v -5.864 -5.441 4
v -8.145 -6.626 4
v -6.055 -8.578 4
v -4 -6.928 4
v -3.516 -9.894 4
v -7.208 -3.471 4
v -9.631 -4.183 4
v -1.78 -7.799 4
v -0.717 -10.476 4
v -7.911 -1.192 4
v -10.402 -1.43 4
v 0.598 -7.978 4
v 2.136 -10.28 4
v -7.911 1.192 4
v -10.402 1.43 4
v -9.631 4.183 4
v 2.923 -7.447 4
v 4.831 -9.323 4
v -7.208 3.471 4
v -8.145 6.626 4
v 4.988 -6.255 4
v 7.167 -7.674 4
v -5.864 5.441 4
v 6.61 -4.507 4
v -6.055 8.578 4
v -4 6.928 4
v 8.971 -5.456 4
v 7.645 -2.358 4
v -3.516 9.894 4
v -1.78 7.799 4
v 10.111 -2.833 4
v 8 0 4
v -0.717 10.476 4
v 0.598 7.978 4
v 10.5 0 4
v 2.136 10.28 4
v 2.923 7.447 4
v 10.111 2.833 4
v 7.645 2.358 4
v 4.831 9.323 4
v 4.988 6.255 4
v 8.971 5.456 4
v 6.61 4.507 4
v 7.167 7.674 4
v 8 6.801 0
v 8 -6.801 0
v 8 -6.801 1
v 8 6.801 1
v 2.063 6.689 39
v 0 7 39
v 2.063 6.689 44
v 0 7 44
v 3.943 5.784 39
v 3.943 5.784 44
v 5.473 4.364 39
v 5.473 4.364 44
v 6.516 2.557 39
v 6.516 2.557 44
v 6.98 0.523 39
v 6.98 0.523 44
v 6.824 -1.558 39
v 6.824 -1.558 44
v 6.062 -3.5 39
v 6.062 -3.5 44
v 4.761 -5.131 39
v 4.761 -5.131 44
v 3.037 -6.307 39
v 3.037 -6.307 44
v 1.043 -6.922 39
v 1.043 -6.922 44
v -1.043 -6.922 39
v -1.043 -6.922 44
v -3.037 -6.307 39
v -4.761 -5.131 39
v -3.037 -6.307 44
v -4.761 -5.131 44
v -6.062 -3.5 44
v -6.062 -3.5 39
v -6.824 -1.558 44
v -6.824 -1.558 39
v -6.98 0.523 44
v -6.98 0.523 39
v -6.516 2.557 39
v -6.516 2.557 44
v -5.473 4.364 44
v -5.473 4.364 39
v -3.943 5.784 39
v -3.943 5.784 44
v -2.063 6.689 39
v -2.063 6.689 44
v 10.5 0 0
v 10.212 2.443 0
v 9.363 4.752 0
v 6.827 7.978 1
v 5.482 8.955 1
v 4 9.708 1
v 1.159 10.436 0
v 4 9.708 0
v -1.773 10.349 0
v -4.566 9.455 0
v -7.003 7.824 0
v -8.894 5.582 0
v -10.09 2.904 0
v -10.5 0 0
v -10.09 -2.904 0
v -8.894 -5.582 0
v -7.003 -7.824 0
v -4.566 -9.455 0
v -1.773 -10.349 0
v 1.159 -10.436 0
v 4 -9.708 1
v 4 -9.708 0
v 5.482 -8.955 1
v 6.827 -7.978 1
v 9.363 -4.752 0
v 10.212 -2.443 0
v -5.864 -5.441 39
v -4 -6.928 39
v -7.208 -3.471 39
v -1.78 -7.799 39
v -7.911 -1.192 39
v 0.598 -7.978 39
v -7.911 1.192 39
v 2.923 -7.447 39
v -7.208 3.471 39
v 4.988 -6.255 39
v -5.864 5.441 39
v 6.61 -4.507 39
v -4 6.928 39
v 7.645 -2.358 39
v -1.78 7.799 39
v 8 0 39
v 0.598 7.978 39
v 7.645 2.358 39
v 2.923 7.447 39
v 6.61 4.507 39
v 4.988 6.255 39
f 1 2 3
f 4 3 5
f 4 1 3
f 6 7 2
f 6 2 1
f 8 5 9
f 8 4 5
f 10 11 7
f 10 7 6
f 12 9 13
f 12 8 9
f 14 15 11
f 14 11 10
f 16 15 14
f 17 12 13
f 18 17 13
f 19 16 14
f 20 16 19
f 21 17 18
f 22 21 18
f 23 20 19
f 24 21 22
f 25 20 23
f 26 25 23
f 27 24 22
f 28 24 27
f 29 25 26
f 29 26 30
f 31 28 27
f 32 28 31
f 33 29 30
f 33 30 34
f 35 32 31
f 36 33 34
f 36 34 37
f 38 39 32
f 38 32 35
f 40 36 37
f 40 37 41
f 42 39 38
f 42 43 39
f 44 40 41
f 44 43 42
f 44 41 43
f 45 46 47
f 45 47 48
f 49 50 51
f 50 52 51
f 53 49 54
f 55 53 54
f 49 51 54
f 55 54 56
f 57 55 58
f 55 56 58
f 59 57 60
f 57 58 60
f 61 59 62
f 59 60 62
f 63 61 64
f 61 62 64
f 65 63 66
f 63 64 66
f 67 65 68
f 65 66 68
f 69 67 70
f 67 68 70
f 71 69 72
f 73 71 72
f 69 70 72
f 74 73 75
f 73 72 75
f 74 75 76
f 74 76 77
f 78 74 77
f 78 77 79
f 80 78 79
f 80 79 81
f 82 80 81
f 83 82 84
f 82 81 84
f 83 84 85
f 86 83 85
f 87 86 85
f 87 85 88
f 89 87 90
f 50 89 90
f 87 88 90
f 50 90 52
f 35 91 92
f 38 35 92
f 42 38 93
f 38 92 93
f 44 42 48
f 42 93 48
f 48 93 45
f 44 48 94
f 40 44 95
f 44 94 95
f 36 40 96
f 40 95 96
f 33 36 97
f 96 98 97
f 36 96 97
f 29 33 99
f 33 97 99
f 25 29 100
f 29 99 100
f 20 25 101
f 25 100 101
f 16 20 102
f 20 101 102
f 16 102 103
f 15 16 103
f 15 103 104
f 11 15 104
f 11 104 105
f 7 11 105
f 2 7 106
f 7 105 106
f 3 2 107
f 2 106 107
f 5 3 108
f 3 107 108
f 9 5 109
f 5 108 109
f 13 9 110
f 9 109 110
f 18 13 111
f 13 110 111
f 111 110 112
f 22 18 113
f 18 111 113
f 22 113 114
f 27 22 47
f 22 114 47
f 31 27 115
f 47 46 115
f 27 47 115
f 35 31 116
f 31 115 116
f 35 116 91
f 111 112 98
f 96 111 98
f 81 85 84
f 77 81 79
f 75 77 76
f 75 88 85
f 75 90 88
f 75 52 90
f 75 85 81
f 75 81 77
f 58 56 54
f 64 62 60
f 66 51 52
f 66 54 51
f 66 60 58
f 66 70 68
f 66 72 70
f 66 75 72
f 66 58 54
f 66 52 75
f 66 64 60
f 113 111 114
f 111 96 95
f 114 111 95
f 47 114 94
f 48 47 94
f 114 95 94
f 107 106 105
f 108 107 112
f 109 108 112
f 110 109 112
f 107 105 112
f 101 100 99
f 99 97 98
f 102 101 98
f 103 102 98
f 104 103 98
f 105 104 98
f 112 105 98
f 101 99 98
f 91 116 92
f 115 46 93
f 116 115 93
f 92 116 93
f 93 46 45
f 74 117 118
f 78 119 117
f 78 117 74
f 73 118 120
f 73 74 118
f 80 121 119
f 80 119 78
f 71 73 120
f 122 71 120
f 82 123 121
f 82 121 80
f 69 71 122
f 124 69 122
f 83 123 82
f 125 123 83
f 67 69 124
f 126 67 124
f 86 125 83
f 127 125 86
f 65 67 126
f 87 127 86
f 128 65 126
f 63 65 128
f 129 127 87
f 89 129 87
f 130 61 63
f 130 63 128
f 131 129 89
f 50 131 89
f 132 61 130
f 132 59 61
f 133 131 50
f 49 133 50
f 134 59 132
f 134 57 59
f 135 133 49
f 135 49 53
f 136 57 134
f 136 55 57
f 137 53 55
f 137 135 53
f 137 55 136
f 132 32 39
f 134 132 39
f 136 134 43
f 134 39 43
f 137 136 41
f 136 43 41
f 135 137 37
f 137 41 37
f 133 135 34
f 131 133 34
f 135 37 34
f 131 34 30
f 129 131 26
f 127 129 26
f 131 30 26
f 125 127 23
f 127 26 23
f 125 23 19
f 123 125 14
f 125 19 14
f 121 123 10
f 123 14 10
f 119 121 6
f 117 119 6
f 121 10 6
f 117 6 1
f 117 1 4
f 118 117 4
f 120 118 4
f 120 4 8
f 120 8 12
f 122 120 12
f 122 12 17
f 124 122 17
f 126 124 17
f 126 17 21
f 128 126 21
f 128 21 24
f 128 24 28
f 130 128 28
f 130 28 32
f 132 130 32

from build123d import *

# Parameters (mm, degrees)
F0_R     = 10.5
F1_DEPTH = 4
F2_R     = 8
F3_DEPTH = 39
F4_W     = 7
F4_H     = 5
F6_W     = 4
F6_H     = 24.978078
F7_DEPTH = 1


with BuildPart() as f1:
    # F0 (on Top) → F1 (new body)
    with BuildSketch(Plane.XY):
        Circle(F0_R)
    extrude(amount=F1_DEPTH)

    # F2 (on Top) → F3 (join)
    with BuildSketch(Plane.XY):
        Circle(F2_R)
    extrude(amount=F3_DEPTH)

    # F4 (on Right) → F5 (revolve)
    with BuildSketch(Plane.YZ):
        with Locations((3.5, 41.5)):
            Rectangle(F4_W, F4_H)
    revolve(axis=Axis((0, 0, 41.5), (0, 0, -1)))

    # F6 (on Top) → F7 (cut)
    with BuildSketch(Plane.XY):
        with Locations((6, 1.013985)):
            Rectangle(F6_W, F6_H)
    extrude(amount=F7_DEPTH, mode=Mode.SUBTRACT)


solid = f1.part
